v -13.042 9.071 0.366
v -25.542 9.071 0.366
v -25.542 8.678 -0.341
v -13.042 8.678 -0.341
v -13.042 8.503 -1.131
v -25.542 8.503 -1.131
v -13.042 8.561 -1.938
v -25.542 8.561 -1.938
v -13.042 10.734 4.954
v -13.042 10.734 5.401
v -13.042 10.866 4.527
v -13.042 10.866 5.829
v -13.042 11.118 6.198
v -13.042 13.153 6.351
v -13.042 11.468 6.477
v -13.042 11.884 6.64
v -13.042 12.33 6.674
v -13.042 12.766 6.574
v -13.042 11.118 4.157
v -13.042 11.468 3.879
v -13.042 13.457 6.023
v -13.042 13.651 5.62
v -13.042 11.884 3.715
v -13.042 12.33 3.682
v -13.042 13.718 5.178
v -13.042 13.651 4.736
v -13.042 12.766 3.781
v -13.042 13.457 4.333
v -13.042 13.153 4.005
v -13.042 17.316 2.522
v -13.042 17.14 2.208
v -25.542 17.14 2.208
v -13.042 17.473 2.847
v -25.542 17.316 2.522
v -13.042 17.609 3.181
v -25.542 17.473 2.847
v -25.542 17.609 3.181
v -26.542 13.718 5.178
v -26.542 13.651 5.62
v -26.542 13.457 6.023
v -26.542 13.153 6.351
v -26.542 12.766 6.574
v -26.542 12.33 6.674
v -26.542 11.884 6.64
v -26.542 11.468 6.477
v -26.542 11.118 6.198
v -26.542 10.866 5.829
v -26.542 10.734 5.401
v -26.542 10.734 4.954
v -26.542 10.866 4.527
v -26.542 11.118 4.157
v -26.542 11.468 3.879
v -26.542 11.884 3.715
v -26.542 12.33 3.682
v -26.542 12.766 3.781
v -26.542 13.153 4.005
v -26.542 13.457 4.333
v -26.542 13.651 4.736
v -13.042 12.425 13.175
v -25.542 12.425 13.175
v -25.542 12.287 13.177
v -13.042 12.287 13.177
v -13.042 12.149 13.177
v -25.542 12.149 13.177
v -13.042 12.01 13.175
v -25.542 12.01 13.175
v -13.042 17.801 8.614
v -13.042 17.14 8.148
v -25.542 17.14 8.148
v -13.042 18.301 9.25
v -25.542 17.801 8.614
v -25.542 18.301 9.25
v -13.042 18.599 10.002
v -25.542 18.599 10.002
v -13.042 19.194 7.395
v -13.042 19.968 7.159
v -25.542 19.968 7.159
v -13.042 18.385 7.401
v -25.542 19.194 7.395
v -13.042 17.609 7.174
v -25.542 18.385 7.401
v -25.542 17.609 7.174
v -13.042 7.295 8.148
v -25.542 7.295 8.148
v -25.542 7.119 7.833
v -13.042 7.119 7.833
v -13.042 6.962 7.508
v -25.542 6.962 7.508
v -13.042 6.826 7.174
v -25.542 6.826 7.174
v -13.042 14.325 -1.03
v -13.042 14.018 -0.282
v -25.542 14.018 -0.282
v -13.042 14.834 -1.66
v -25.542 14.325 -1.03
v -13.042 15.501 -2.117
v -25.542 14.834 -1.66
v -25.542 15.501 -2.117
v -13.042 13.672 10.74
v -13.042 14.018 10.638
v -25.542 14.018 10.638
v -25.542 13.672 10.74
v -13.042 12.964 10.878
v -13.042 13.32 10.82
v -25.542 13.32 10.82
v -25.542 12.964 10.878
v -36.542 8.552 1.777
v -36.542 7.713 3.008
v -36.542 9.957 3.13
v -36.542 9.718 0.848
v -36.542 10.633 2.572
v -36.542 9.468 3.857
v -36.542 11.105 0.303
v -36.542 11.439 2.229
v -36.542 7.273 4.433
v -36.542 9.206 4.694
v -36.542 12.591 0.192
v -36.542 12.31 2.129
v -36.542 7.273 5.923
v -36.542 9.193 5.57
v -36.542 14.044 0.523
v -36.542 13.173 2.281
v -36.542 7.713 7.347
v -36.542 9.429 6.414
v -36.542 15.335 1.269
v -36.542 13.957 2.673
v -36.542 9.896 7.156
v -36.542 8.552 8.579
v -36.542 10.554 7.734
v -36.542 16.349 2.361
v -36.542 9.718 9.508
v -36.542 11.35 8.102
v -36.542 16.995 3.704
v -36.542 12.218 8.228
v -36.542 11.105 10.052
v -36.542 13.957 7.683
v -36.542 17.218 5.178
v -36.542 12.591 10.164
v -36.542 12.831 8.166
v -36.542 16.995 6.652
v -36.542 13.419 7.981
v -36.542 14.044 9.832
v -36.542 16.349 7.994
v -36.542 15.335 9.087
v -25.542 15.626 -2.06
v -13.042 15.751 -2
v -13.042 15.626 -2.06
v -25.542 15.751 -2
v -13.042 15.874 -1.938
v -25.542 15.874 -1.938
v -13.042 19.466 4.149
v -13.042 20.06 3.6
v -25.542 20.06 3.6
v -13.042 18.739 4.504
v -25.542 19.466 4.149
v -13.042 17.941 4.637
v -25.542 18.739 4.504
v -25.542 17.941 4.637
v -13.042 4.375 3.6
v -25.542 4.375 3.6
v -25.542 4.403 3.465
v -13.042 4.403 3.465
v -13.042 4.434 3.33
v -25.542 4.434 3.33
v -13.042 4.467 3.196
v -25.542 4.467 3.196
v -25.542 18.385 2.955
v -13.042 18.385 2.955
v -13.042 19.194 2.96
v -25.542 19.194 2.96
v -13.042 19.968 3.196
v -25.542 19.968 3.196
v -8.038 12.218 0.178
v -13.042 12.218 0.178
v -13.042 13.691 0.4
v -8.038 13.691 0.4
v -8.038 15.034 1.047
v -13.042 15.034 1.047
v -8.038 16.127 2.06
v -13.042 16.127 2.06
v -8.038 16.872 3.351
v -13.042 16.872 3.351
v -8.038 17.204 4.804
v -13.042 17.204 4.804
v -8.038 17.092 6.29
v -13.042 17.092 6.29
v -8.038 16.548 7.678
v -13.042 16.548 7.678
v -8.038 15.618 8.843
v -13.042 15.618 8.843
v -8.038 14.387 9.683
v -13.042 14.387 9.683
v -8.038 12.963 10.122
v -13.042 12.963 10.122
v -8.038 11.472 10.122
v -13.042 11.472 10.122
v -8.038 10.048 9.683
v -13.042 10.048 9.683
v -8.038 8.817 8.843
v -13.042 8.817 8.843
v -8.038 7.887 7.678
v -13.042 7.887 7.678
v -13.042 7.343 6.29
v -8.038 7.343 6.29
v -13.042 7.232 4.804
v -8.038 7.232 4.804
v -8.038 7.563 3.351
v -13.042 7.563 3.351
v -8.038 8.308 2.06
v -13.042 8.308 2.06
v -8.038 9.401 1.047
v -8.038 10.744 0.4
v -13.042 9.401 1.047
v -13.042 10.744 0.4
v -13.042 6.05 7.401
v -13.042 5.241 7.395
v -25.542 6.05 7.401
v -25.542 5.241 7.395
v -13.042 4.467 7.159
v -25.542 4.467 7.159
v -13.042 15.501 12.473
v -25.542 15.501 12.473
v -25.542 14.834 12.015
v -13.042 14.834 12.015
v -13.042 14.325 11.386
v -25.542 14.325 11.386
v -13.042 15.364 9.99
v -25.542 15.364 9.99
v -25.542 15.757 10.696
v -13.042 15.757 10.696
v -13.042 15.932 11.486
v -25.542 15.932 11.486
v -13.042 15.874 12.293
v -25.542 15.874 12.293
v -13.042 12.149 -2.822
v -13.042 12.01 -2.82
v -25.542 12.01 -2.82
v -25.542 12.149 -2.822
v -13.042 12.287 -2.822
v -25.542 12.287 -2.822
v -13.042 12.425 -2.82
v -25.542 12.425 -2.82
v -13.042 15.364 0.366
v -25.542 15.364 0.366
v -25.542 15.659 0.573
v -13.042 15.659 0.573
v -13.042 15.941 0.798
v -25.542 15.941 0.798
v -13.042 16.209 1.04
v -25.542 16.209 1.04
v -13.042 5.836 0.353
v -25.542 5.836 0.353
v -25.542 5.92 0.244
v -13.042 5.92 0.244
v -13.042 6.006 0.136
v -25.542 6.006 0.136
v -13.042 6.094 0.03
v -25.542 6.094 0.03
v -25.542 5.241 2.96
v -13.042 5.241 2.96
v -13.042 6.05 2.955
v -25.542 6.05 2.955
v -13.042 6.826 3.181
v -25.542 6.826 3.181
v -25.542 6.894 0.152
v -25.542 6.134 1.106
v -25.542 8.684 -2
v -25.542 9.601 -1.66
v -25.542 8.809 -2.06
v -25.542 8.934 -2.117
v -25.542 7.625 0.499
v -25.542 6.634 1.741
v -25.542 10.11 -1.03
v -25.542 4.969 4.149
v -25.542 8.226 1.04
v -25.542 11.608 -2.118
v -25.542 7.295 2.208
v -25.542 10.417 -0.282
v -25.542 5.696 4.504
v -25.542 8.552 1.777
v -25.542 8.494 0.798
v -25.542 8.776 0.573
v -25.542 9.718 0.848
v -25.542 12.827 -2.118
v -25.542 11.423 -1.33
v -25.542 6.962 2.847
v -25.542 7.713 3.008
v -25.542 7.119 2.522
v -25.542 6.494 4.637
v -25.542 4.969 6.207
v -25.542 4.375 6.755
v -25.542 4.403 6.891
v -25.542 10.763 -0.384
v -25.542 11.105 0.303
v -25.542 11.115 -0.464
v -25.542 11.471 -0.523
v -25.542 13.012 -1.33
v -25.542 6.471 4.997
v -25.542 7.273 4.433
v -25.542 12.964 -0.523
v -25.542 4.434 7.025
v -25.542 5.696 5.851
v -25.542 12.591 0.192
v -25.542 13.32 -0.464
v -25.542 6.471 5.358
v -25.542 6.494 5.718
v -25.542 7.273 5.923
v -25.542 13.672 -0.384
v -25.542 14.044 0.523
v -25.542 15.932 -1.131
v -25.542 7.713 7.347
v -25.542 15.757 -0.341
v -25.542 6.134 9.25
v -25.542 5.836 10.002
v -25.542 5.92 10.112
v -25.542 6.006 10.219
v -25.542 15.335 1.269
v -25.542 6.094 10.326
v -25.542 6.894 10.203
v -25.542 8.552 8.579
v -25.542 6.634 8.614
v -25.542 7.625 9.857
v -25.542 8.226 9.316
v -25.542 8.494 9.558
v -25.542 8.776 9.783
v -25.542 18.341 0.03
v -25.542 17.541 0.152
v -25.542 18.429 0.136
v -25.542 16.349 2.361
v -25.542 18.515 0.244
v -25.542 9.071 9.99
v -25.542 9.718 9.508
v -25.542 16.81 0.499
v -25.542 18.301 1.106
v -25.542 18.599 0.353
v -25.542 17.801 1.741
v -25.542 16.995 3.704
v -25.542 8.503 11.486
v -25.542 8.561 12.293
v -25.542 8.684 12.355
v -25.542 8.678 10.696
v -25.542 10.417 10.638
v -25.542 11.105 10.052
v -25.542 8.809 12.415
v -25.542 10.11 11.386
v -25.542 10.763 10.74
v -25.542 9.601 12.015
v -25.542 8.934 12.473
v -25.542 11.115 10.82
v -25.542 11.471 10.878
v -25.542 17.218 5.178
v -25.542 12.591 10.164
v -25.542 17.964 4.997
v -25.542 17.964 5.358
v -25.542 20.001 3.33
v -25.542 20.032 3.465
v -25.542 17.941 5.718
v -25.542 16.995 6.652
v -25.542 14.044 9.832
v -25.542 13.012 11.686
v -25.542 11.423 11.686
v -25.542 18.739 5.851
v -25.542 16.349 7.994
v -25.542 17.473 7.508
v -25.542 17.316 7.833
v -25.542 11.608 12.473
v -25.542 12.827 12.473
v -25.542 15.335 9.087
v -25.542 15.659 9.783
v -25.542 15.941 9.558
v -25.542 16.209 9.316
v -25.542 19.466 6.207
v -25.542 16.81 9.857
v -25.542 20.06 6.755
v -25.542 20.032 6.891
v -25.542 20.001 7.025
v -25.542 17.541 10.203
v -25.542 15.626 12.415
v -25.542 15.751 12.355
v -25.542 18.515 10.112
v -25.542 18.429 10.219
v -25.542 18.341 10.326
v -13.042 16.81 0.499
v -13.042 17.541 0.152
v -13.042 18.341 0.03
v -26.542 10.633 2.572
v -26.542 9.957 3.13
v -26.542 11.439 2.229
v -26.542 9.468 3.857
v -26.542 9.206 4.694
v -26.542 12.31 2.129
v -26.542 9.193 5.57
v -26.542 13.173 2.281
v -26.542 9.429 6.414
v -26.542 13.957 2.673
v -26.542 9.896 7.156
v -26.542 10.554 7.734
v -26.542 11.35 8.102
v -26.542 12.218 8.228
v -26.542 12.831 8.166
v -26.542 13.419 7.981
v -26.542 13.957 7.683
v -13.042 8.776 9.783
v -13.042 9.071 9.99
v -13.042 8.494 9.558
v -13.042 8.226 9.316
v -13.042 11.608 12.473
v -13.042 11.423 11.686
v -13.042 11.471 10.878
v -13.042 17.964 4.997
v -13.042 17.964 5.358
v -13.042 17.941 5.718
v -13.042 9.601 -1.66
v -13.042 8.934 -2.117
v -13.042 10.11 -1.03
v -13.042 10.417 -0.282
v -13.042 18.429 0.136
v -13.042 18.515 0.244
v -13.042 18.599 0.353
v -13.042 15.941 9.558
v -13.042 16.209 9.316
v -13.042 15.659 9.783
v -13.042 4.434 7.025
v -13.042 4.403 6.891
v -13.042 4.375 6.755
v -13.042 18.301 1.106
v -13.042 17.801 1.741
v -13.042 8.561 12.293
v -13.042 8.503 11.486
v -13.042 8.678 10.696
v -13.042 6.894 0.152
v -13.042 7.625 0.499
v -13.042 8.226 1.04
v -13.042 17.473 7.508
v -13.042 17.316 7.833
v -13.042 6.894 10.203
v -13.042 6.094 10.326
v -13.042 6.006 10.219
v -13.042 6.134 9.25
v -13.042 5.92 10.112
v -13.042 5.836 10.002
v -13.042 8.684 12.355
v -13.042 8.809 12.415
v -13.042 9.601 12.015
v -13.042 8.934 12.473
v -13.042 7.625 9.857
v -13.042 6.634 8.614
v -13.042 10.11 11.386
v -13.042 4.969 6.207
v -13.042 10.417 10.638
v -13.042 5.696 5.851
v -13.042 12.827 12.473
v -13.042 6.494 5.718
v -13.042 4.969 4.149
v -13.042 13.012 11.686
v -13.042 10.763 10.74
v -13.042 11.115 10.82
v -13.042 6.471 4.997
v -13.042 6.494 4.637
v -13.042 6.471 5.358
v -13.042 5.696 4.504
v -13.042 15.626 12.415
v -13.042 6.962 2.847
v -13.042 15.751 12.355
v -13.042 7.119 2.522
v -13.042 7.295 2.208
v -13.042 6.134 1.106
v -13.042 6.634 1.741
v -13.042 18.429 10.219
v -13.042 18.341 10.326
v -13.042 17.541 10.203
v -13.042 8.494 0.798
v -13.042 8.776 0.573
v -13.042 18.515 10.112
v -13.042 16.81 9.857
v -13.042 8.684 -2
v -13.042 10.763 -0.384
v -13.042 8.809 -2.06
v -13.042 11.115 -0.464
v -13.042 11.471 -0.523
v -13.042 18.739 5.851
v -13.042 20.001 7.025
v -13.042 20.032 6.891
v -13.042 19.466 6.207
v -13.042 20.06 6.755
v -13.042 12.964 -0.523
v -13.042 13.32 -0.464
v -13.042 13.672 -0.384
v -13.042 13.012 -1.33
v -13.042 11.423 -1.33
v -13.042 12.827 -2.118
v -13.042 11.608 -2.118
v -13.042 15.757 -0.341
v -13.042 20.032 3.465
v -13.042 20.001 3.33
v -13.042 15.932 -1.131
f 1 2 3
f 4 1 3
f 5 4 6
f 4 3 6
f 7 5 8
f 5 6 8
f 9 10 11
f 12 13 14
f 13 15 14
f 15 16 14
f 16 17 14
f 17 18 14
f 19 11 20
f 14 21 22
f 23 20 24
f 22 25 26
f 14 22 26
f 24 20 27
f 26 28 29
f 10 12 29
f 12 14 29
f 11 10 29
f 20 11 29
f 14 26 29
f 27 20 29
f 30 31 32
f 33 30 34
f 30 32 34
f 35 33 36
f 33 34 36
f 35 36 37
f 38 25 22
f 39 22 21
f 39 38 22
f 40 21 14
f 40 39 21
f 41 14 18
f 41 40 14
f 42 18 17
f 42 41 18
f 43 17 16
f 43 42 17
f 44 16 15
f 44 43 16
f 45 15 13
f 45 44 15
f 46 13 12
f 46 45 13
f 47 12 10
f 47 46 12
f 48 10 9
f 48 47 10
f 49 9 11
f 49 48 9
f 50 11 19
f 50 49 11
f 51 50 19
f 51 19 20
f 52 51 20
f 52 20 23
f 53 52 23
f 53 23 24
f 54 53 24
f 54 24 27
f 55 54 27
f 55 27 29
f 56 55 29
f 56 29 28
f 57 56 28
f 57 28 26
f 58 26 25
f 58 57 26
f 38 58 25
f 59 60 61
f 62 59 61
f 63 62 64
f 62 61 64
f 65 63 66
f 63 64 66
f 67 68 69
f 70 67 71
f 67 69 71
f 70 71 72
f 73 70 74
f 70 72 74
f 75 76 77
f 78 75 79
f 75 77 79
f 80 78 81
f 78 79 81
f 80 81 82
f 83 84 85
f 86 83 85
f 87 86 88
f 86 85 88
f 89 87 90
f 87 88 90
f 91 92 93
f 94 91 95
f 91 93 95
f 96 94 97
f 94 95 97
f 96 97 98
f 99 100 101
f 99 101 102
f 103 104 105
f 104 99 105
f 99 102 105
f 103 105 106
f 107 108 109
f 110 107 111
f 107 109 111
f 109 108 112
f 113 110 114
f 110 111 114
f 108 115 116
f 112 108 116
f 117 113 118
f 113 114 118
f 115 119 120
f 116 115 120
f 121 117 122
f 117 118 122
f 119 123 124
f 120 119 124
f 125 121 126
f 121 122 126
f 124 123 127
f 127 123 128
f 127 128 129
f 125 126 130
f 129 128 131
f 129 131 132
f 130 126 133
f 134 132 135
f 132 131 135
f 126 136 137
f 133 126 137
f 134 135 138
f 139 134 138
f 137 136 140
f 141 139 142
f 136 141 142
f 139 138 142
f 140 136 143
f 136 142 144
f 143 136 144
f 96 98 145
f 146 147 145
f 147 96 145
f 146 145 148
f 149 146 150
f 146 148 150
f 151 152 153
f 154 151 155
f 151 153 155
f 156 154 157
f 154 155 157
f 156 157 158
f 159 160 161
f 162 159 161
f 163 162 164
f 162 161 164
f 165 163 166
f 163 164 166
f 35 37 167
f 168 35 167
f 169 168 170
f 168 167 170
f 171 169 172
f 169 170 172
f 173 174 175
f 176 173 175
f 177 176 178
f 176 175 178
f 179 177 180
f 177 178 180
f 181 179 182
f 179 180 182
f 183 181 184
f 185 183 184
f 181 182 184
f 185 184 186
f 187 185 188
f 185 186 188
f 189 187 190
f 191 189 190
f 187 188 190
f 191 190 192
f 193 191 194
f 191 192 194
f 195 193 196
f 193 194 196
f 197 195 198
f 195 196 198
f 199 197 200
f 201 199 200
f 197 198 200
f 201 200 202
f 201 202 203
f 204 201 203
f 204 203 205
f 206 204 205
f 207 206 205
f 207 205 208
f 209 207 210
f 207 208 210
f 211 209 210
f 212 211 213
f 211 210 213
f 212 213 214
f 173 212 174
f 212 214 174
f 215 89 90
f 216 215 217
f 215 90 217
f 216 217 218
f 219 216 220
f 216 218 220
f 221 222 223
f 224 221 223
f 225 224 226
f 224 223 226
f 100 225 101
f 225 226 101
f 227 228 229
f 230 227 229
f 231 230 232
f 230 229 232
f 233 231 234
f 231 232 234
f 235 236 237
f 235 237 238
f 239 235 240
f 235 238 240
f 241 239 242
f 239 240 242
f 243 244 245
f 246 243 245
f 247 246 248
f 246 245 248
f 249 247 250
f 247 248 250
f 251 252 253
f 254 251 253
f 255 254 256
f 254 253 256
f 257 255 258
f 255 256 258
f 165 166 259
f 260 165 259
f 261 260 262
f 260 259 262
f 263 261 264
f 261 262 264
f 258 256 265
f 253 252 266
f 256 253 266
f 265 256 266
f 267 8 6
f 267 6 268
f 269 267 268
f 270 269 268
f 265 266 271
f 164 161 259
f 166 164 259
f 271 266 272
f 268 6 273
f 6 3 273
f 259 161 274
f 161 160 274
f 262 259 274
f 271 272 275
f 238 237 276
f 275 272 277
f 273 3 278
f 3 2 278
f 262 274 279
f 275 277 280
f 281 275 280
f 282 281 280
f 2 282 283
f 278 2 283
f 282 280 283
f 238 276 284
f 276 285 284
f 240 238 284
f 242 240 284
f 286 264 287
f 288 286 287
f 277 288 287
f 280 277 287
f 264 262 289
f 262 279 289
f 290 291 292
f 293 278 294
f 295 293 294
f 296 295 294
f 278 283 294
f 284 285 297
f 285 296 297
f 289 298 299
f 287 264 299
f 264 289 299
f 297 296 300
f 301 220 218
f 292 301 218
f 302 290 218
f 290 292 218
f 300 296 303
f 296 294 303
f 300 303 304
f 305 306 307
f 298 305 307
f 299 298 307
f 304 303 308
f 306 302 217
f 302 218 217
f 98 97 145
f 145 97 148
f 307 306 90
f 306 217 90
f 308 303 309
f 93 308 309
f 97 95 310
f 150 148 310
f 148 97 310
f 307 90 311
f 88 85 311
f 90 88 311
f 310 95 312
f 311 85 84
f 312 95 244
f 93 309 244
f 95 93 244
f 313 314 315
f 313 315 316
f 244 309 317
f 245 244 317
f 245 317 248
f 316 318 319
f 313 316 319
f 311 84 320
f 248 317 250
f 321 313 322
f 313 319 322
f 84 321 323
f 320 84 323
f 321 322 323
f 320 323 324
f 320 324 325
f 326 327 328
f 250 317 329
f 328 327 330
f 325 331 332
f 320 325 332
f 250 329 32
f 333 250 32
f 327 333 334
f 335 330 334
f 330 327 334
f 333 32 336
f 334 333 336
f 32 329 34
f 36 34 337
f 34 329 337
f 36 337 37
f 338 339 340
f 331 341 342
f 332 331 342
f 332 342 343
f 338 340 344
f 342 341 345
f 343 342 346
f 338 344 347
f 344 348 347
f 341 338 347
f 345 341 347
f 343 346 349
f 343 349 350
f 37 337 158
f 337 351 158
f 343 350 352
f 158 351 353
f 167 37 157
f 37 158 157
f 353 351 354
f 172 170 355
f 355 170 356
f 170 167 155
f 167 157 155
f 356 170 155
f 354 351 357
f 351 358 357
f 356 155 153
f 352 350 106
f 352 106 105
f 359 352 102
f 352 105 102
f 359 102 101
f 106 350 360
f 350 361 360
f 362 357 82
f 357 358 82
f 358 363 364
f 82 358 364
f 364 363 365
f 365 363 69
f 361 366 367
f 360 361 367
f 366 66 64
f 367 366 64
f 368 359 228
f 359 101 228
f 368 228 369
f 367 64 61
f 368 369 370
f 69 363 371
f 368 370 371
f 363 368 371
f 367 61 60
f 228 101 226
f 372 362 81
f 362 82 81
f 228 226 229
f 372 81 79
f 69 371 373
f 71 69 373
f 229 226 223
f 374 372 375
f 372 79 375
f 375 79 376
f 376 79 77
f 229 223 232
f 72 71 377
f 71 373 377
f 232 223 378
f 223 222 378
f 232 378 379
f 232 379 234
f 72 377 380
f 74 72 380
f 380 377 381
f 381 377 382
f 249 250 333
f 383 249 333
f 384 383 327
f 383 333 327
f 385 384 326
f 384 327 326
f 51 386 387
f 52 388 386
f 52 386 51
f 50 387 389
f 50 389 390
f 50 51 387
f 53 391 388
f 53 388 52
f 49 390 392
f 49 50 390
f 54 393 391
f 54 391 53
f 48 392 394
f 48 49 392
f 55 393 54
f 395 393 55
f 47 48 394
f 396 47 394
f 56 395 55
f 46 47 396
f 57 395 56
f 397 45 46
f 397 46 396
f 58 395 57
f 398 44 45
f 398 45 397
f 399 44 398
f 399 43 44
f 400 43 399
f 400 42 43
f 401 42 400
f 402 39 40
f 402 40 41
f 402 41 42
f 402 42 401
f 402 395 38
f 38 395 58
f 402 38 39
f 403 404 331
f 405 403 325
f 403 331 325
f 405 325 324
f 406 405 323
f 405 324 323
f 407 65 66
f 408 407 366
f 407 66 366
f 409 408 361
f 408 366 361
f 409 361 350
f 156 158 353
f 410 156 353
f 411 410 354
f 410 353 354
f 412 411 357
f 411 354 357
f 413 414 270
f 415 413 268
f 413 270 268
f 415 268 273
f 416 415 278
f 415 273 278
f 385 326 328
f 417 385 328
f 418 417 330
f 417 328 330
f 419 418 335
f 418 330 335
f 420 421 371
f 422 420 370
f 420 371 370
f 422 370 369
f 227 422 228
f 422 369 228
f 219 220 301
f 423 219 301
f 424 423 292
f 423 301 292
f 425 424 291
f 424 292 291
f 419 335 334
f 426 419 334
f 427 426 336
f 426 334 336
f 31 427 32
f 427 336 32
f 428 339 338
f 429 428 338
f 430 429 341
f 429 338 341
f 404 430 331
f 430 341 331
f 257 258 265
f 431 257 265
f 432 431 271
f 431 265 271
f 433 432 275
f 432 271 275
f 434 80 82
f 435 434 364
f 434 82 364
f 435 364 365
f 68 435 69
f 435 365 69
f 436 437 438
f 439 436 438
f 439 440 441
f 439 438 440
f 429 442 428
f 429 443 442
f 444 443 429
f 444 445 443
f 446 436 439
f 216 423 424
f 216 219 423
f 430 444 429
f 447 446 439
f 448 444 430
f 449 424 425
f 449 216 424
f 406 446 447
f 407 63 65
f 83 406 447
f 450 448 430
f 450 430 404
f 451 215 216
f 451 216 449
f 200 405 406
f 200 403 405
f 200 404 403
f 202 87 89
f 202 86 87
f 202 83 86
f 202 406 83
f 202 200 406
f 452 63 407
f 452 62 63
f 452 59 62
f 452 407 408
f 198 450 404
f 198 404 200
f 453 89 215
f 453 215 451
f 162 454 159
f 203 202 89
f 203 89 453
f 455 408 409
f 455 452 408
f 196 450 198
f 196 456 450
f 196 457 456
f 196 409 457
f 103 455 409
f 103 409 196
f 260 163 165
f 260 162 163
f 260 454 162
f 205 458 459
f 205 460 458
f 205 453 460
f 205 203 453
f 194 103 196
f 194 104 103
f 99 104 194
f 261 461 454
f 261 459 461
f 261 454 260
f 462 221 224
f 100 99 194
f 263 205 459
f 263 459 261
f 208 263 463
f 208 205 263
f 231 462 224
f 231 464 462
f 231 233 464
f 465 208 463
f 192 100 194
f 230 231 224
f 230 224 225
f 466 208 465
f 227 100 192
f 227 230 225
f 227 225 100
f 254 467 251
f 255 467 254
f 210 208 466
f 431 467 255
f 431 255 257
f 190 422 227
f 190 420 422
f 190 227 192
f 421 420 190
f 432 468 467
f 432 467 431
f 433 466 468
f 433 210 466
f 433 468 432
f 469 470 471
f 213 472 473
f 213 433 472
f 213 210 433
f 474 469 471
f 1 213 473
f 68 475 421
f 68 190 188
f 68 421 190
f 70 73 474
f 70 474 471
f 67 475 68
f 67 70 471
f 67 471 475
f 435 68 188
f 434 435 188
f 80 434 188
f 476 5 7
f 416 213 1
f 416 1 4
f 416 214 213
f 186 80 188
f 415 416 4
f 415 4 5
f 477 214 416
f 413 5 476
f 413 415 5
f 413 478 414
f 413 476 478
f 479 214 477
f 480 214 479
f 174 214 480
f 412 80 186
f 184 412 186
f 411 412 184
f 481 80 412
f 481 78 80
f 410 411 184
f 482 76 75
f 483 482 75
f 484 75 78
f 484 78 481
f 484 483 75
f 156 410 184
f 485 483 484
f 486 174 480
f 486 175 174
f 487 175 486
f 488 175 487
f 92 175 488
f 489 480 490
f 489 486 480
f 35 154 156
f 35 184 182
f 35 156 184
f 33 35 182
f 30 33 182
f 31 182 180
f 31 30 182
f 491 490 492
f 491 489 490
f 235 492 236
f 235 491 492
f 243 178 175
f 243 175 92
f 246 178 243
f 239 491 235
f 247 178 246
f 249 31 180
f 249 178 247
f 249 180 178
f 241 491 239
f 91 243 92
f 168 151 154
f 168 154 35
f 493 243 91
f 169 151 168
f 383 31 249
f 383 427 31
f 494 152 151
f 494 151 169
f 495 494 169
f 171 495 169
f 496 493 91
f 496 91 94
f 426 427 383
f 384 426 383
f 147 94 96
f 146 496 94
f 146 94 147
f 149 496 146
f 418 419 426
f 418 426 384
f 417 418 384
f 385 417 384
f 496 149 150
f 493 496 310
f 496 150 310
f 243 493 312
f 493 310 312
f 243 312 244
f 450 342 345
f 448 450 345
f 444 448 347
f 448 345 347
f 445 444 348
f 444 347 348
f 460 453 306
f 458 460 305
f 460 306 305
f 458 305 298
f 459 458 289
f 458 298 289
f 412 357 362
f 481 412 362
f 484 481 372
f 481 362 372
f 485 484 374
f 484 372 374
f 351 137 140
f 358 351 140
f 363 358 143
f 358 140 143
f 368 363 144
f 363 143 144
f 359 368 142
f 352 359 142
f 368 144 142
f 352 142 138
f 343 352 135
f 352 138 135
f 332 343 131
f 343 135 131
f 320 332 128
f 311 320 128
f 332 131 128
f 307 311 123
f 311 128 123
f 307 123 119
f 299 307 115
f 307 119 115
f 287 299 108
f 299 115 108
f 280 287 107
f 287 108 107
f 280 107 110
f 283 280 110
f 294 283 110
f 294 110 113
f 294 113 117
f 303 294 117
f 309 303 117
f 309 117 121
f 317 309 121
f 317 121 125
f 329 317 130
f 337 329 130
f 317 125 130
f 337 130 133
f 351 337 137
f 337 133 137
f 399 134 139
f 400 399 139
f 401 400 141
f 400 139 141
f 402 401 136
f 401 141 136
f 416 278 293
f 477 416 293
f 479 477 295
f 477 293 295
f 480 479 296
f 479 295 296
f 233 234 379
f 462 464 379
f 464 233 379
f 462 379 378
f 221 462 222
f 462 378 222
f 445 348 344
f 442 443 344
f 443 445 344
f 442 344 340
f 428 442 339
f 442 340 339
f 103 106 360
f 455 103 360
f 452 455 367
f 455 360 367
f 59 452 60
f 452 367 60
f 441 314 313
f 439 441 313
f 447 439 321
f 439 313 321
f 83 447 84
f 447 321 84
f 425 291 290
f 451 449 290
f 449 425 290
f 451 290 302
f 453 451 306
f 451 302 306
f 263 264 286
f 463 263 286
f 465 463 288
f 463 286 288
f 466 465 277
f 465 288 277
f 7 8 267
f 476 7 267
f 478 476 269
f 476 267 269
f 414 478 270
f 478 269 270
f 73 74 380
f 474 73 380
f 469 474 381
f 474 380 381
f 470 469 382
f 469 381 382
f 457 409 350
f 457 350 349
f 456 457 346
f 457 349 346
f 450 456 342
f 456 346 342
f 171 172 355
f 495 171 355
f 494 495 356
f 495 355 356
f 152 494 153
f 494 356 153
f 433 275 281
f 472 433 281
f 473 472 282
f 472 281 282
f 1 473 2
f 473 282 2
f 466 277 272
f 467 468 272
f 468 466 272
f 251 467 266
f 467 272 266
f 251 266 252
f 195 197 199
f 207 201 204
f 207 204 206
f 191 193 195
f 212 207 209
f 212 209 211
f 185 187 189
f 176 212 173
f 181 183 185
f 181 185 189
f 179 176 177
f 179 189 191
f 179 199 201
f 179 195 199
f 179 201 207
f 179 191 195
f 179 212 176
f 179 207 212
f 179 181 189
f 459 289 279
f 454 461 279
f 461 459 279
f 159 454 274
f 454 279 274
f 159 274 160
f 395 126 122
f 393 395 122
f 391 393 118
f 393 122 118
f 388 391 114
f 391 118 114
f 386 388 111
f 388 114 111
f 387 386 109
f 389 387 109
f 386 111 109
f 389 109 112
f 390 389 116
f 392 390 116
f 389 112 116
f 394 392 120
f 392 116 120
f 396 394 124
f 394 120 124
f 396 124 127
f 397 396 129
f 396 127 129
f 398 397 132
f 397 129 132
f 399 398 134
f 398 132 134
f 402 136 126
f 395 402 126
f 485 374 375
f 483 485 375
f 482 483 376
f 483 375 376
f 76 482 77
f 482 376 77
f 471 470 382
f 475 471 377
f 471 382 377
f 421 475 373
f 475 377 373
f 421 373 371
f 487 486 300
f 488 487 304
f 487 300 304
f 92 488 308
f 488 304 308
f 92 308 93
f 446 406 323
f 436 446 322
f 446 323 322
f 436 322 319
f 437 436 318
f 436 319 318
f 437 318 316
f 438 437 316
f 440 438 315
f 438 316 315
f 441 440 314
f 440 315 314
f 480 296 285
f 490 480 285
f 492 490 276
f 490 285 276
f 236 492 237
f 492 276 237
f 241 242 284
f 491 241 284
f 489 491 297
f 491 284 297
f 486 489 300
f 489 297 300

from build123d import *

# Parameters (mm, degrees)
SPUR_START                 = -25.541998066
SPUR_GEAR_AM_OUTLINE_R     = 1.5
SPUR_GEAR_AM_DEPTH         = 14
SPUR_START_2               = -36.542048866
SPUR_GEAR_AM_2_OUTLINE_R   = 5
SPUR_GEAR_AM_2_OUTLINE_R_2 = 1.5
SPUR_GEAR_AM_2_DEPTH       = 11.0000508
SKETCH1_R                  = 10.392655515
CUT_EXTRUDE1_DEPTH         = 1.500223942
SKETCH2_R                  = 5
BOSS_EXTRUDE1_DEPTH        = 5.004484533
SKETCH3_R                  = 1.5
CUT_EXTRUDE2_DEPTH         = 10


# Read off the part's stored shape, not the designer's step: spur gear_am
with BuildPart() as part:
    # spur gear_am outline → spur gear_am (new body)
    with BuildSketch(Plane.YZ.offset(SPUR_START)):
        with BuildLine():
            ThreePointArc((8.934177524, 12.472931761), (8.746459365, 12.38550613), (8.561066896, 12.293251153))
            ThreePointArc((8.561066896, 12.293251153), (8.561742052, 11.085003925), (9.071453323, 9.989533141))
            ThreePointArc((9.071453323, 9.989533141), (8.633086407, 9.672504379), (8.226460402, 9.315673773))
            ThreePointArc((8.226460402, 9.315673773), (7.271876786, 10.0563707), (6.094073075, 10.325889231))
            ThreePointArc((6.094073075, 10.325889231), (5.962877418, 10.165673601), (5.835872509, 10.002115962))
            ThreePointArc((5.835872509, 10.002115962), (6.360719629, 8.913815765), (7.295260575, 8.147986124))
            ThreePointArc((7.295260575, 8.147986124), (7.037859256, 7.672152803), (6.826324883, 7.174231124))
            ThreePointArc((6.826324883, 7.174231124), (5.64489841, 7.427397687), (4.466794227, 7.159195615))
            ThreePointArc((4.466794227, 7.159195615), (4.41810598, 6.957922658), (4.374643512, 6.755456952))
            ThreePointArc((4.374643512, 6.755456952), (5.319710186, 6.002654986), (6.493983512, 5.718148442))
            ThreePointArc((6.493983512, 5.718148442), (6.468529278, 5.177755187), (6.493983512, 4.637361931))
            ThreePointArc((6.493983512, 4.637361931), (5.319710186, 4.352855387), (4.374643512, 3.600053421))
            ThreePointArc((4.374643512, 3.600053421), (4.41810598, 3.397587715), (4.466794227, 3.196314758))
            ThreePointArc((4.466794227, 3.196314758), (5.64489841, 2.928112685), (6.826324883, 3.181279248))
            ThreePointArc((6.826324883, 3.181279248), (7.037859256, 2.68335757), (7.295260575, 2.207524249))
            ThreePointArc((7.295260575, 2.207524249), (6.360719629, 1.441694608), (5.835872509, 0.353394411))
            ThreePointArc((5.835872509, 0.353394411), (5.962877418, 0.189836772), (6.094073075, 0.029621142))
            ThreePointArc((6.094073075, 0.029621142), (7.271876786, 0.299139672), (8.226460402, 1.039836599))
            ThreePointArc((8.226460402, 1.039836599), (8.633086407, 0.683005994), (9.071453323, 0.365977232))
            ThreePointArc((9.071453323, 0.365977232), (8.561742052, -0.729493552), (8.561066896, -1.93774078))
            ThreePointArc((8.561066896, -1.93774078), (8.746459365, -2.029995757), (8.934177524, -2.117421389))
            ThreePointArc((8.934177524, -2.117421389), (9.878402292, -1.363563706), (10.41707606, -0.282040525))
            ThreePointArc((10.41707606, -0.282040525), (10.938256428, -0.427105381), (11.470764997, -0.522538149))
            ThreePointArc((11.470764997, -0.522538149), (11.48683797, -1.730678653), (12.0104685, -2.819564729))
            ThreePointArc((12.0104685, -2.819564729), (12.217529278, -2.822244814), (12.424590055, -2.819564729))
            ThreePointArc((12.424590055, -2.819564729), (12.948220585, -1.730678653), (12.964293559, -0.522538149))
            ThreePointArc((12.964293559, -0.522538149), (13.496802127, -0.427105381), (14.017982495, -0.282040525))
            ThreePointArc((14.017982495, -0.282040525), (14.556656263, -1.363563706), (15.500881031, -2.117421389))
            ThreePointArc((15.500881031, -2.117421389), (15.688599191, -2.029995757), (15.87399166, -1.93774078))
            ThreePointArc((15.87399166, -1.93774078), (15.873316504, -0.729493552), (15.363605233, 0.365977232))
            ThreePointArc((15.363605233, 0.365977232), (15.801972149, 0.683005994), (16.208598153, 1.039836599))
            ThreePointArc((16.208598153, 1.039836599), (17.16318177, 0.299139672), (18.34098548, 0.029621142))
            ThreePointArc((18.34098548, 0.029621142), (18.472181137, 0.189836772), (18.599186046, 0.353394411))
            ThreePointArc((18.599186046, 0.353394411), (18.074338927, 1.441694609), (17.13979798, 2.207524249))
            ThreePointArc((17.13979798, 2.207524249), (17.397199299, 2.68335757), (17.608733673, 3.181279248))
            ThreePointArc((17.608733673, 3.181279248), (18.790160146, 2.928112685), (19.968264329, 3.196314758))
            ThreePointArc((19.968264329, 3.196314758), (20.016952575, 3.397587715), (20.060415044, 3.600053421))
            ThreePointArc((20.060415044, 3.600053421), (19.11534837, 4.352855387), (17.941075043, 4.637361931))
            ThreePointArc((17.941075043, 4.637361931), (17.966529278, 5.177755187), (17.941075043, 5.718148442))
            ThreePointArc((17.941075043, 5.718148442), (19.11534837, 6.002654986), (20.060415044, 6.755456952))
            ThreePointArc((20.060415044, 6.755456952), (20.016952575, 6.957922658), (19.968264329, 7.159195615))
            ThreePointArc((19.968264329, 7.159195615), (18.790160146, 7.427397687), (17.608733673, 7.174231124))
            ThreePointArc((17.608733673, 7.174231124), (17.397199299, 7.672152802), (17.13979798, 8.147986124))
            ThreePointArc((17.13979798, 8.147986124), (18.074338927, 8.913815764), (18.599186046, 10.002115962))
            ThreePointArc((18.599186046, 10.002115962), (18.472181137, 10.165673601), (18.34098548, 10.325889231))
            ThreePointArc((18.34098548, 10.325889231), (17.16318177, 10.0563707), (16.208598153, 9.315673773))
            ThreePointArc((16.208598153, 9.315673773), (15.801972149, 9.672504379), (15.363605233, 9.989533141))
            ThreePointArc((15.363605233, 9.989533141), (15.873316504, 11.085003925), (15.87399166, 12.293251153))
            ThreePointArc((15.87399166, 12.293251153), (15.688599191, 12.38550613), (15.500881031, 12.472931761))
            ThreePointArc((15.500881031, 12.472931761), (14.556656263, 11.719074079), (14.017982495, 10.637550898))
            ThreePointArc((14.017982495, 10.637550898), (13.496802127, 10.782615754), (12.964293559, 10.878048522))
            ThreePointArc((12.964293559, 10.878048522), (12.948220585, 12.086189026), (12.424590055, 13.175075102))
            ThreePointArc((12.424590055, 13.175075102), (12.217529278, 13.177755186), (12.0104685, 13.175075102))
            ThreePointArc((12.0104685, 13.175075102), (11.48683797, 12.086189026), (11.470764997, 10.878048522))
            ThreePointArc((11.470764997, 10.878048522), (10.938256428, 10.782615754), (10.41707606, 10.637550898))
            ThreePointArc((10.41707606, 10.637550898), (9.878402292, 11.719074079), (8.934177524, 12.472931761))
        make_face()
        with Locations((12.217529278, 5.177755186)):
            Circle(SPUR_GEAR_AM_OUTLINE_R, mode=Mode.SUBTRACT)
    extrude(amount=SPUR_GEAR_AM_DEPTH)

    # spur gear_am 2 outline → spur gear_am 2 (add)
    with BuildSketch(Plane.YZ.offset(SPUR_START_2)):
        with Locations((12.217529278, 5.177755186)):
            Circle(SPUR_GEAR_AM_2_OUTLINE_R)
        with Locations((12.217529278, 5.177755186)):
            Circle(SPUR_GEAR_AM_2_OUTLINE_R_2, mode=Mode.SUBTRACT)
    extrude(amount=SPUR_GEAR_AM_2_DEPTH)

    # Sketch1 → Cut-Extrude1 (cut)
    with BuildSketch(Plane(origin=(-11.541998066, 0, 0), x_dir=(0, 0, -1), z_dir=(1, 0, 0))):
        with Locations((-5.177755186, 12.217529278)):
            Circle(SKETCH1_R)
    extrude(amount=-CUT_EXTRUDE1_DEPTH, mode=Mode.SUBTRACT)

    # Sketch2 → Boss-Extrude1 (add)
    with BuildSketch(Plane(origin=(-13.042222007, 0, 0), x_dir=(0, 0, -1), z_dir=(1, 0, 0))):
        with Locations((-5.177755186, 12.217529278)):
            Circle(SKETCH2_R)
    extrude(amount=BOSS_EXTRUDE1_DEPTH)

    # Sketch3 → Cut-Extrude2 (cut)
    with BuildSketch(Plane.ZY.offset(36.542048866)):
        with BuildLine():
            Line((7.682755186, 13.957493358), (2.672755186, 13.957493358))
            ThreePointArc((2.672755186, 13.957493358), (4.266094614, 9.306966617), (8.227755186, 12.217529278))
            ThreePointArc((8.227755186, 12.217529278), (8.088317847, 13.12918985), (7.682755186, 13.957493358))
        make_face()
        with Locations((5.177755186, 12.217529278)):
            Circle(SKETCH3_R, mode=Mode.SUBTRACT)
    extrude(amount=-CUT_EXTRUDE2_DEPTH, mode=Mode.SUBTRACT)


solid = part.part
